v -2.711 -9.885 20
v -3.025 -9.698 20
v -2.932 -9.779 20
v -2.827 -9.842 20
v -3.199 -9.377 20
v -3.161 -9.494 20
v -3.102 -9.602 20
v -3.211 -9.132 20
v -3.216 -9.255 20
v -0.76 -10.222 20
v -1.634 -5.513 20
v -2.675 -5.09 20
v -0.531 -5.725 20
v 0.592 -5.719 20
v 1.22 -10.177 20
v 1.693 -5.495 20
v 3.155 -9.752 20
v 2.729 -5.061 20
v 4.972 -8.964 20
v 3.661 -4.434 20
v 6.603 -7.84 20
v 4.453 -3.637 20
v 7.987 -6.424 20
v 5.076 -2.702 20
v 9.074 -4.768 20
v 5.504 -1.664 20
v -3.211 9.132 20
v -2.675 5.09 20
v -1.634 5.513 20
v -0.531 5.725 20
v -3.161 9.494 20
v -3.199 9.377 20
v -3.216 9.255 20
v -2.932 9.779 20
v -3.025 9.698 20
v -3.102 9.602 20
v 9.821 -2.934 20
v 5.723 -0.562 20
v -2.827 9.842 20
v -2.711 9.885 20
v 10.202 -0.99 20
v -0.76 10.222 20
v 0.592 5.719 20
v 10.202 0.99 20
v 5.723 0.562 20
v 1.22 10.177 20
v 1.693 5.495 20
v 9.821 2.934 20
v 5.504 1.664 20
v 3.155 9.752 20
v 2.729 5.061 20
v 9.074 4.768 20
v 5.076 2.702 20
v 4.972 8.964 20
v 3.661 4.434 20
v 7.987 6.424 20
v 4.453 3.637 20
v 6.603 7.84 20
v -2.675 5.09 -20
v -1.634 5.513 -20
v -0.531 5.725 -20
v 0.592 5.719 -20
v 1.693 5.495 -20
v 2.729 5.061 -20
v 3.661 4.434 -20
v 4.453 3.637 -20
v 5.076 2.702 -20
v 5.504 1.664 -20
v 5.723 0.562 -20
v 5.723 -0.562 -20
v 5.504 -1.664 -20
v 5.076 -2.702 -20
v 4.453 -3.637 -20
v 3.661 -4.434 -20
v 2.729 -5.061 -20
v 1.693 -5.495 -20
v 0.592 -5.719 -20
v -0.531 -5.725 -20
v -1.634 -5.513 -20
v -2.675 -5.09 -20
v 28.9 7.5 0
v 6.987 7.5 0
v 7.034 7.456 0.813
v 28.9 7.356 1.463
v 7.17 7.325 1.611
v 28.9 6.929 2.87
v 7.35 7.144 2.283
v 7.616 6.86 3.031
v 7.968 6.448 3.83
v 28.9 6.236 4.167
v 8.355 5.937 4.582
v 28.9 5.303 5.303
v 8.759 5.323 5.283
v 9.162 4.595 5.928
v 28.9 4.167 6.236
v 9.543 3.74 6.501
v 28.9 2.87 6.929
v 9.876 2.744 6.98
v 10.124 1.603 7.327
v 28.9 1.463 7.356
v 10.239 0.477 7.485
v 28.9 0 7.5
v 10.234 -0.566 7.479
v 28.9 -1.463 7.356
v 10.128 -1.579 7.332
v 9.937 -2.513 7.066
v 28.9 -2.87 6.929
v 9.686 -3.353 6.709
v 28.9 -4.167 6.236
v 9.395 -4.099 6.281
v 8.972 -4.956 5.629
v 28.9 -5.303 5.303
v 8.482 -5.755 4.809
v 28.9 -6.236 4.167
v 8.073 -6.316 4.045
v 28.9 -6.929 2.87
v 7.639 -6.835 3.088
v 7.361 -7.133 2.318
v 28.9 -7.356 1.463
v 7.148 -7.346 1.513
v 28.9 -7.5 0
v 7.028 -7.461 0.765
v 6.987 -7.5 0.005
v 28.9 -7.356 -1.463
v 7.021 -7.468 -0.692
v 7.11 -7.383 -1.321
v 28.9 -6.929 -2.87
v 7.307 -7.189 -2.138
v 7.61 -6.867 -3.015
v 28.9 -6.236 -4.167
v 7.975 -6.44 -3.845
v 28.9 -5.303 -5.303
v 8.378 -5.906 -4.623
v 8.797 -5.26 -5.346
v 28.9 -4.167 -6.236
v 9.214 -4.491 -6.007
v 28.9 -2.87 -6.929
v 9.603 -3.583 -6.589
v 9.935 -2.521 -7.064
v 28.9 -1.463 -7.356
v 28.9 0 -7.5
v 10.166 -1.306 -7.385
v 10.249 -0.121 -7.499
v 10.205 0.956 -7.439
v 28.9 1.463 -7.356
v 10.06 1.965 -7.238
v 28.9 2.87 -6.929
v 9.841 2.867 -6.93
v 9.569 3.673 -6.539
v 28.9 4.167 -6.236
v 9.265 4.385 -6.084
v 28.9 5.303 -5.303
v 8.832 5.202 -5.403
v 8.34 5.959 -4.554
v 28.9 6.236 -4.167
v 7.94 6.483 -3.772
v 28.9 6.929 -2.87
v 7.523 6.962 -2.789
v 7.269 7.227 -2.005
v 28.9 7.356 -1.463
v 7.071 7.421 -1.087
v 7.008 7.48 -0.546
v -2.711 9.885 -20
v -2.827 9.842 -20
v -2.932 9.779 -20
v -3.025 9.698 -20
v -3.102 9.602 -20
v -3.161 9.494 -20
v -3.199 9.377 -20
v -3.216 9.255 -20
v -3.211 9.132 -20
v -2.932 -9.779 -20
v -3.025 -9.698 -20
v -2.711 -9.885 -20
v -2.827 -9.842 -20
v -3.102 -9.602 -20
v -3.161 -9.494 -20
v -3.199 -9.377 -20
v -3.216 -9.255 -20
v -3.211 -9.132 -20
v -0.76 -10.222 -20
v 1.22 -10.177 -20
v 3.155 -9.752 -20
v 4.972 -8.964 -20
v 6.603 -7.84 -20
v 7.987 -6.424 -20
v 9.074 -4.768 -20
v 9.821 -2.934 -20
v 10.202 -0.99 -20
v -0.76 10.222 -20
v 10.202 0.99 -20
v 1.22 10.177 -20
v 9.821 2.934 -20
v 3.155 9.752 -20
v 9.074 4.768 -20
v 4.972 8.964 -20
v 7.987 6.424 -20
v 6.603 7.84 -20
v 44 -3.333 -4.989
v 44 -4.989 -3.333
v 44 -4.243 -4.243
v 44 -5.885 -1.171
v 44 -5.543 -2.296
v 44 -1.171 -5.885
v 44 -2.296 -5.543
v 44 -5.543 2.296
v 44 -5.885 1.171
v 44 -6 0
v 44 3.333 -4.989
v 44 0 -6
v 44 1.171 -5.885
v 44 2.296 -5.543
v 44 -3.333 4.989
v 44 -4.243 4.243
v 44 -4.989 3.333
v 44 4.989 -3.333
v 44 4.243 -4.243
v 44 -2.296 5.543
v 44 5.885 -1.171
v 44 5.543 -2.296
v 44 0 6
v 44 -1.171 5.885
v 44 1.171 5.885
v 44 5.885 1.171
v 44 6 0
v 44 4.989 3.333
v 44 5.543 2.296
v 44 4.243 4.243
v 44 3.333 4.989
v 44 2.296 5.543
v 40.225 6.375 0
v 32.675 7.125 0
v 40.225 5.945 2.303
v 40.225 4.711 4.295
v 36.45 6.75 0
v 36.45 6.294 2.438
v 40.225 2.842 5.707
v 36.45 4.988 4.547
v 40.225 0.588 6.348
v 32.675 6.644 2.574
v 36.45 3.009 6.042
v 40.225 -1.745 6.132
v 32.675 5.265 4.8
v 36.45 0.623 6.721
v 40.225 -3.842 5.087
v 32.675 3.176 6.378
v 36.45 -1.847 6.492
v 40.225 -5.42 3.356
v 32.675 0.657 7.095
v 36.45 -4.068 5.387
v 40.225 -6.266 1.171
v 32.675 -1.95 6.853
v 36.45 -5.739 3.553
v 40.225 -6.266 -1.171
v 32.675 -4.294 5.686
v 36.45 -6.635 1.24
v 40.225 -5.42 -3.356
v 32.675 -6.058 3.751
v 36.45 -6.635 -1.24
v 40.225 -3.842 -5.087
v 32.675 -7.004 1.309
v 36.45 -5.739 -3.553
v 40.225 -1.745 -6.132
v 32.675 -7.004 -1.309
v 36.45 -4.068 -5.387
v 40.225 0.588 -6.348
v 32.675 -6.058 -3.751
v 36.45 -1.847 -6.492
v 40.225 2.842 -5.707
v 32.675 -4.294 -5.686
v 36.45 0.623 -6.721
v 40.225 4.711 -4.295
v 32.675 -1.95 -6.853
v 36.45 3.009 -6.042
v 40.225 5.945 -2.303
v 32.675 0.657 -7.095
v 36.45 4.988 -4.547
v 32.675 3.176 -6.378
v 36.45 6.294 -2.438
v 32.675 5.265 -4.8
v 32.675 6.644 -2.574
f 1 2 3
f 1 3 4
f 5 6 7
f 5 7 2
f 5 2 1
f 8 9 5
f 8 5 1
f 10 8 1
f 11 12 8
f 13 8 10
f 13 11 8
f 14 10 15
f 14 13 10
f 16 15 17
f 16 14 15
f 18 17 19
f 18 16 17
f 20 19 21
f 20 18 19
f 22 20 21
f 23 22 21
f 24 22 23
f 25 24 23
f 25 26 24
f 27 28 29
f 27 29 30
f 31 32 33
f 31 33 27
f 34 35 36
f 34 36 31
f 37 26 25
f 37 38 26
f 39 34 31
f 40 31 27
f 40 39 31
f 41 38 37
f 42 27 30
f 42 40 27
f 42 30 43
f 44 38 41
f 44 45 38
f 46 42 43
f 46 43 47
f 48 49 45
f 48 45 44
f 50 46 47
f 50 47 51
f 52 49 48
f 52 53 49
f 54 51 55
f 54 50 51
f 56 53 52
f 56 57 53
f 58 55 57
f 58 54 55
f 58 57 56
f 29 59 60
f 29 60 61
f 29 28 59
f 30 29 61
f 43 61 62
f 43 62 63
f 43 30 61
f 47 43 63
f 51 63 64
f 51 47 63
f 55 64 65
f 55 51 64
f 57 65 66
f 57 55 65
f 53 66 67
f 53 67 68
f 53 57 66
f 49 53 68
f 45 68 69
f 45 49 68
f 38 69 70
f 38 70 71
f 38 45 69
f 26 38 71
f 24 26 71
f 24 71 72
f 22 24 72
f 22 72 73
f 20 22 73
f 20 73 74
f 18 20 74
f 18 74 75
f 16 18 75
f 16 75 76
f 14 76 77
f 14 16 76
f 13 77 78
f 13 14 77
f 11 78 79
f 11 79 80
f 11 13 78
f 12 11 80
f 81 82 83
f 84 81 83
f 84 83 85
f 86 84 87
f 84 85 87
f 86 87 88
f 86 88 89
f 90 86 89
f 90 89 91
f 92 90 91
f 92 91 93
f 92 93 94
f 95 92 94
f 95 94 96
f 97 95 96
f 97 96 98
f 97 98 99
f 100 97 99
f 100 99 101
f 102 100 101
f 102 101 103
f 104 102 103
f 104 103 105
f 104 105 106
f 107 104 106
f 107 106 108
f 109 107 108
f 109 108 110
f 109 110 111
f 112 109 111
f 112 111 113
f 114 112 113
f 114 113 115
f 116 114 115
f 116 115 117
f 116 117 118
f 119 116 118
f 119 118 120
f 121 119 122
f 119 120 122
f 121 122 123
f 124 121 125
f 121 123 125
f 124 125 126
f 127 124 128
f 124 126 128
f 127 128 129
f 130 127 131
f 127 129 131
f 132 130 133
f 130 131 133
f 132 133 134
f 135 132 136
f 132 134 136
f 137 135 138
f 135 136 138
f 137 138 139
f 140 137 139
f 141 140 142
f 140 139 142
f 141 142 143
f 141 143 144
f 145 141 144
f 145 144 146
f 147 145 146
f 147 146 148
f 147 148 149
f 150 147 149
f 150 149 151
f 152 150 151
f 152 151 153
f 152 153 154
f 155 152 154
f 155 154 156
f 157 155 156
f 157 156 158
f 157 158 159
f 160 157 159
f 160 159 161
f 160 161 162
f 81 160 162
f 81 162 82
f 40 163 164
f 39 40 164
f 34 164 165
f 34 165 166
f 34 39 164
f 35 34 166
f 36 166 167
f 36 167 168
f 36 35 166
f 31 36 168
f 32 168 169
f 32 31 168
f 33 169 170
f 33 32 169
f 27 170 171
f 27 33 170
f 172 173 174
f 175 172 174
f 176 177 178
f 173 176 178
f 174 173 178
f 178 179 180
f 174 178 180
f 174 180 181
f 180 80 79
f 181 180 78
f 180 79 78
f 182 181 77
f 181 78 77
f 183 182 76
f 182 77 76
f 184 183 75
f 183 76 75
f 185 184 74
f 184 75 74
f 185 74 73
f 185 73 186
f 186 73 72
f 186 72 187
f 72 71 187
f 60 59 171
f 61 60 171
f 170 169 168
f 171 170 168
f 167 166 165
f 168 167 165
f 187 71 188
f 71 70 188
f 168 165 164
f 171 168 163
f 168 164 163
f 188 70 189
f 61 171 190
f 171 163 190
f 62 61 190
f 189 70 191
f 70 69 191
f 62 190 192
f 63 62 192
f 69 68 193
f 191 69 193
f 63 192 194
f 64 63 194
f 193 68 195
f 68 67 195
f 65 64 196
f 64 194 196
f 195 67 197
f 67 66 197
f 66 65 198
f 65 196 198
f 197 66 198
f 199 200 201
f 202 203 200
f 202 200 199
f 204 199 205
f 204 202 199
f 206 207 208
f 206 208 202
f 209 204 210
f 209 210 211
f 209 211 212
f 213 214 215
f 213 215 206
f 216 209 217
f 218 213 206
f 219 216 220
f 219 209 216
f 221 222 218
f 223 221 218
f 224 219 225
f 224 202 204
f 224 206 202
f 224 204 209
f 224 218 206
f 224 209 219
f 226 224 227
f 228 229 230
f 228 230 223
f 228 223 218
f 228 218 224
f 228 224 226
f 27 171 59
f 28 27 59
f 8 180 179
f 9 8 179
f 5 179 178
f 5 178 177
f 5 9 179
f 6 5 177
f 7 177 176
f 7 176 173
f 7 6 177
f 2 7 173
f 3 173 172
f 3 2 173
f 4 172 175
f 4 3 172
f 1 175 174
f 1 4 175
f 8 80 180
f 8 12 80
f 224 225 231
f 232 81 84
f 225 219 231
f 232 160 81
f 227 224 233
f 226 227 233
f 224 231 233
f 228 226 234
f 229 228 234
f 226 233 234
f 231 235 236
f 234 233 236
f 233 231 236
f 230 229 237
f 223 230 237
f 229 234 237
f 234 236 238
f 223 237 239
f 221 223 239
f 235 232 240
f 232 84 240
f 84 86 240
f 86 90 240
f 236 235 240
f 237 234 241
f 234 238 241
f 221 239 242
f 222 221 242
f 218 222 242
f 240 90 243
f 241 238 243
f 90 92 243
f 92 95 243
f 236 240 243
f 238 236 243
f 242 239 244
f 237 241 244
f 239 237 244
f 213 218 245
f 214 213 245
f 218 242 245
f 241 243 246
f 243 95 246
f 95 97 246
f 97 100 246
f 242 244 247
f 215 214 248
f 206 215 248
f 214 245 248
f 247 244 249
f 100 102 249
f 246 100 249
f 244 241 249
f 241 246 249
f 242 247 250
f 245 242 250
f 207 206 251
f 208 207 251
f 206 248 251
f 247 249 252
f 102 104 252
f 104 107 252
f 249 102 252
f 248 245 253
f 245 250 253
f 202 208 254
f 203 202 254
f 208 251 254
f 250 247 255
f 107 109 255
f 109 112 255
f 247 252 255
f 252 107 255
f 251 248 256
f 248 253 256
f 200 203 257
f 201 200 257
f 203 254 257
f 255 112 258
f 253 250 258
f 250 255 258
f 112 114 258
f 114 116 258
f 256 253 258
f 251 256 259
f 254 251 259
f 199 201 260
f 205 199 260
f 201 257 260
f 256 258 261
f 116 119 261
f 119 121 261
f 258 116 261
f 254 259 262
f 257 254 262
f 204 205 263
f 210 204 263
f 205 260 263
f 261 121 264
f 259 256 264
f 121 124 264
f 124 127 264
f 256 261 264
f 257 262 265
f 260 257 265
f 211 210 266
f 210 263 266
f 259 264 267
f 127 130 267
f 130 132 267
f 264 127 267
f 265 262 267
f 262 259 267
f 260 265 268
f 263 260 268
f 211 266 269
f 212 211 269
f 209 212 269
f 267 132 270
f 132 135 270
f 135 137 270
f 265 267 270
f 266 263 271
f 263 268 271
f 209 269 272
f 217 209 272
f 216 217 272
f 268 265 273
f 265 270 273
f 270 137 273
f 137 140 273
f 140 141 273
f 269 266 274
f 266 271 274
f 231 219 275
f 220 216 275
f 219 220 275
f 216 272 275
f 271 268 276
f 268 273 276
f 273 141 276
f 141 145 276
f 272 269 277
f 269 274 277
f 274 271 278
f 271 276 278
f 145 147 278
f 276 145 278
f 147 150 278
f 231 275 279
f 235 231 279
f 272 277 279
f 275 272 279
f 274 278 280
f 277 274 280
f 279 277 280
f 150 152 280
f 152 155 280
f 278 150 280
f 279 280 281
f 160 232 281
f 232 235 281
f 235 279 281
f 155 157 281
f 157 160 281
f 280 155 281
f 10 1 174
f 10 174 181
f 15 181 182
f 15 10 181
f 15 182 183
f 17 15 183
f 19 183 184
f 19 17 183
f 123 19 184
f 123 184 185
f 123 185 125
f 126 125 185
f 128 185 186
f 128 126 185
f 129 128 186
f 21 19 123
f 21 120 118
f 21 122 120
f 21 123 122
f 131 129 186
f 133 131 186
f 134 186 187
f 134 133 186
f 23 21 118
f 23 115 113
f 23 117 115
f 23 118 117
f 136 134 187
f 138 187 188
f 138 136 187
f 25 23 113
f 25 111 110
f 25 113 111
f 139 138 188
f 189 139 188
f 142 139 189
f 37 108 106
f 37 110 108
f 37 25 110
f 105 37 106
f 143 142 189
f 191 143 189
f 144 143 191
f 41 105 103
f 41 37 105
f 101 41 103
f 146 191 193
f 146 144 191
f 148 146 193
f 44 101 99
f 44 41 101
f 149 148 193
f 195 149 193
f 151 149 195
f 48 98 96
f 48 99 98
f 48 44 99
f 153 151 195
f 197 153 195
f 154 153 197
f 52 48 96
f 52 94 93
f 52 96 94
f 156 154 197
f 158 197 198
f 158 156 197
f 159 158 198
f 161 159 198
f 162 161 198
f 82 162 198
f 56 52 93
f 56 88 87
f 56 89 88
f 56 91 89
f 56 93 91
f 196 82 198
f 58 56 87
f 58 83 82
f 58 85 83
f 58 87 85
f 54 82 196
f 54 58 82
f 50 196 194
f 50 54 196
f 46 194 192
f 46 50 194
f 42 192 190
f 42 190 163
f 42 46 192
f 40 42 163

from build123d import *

# Parameters (mm, degrees)
F2_R     = 7.5
F3_DEPTH = 40
F4_SIZE2 = 15.1
F4_SIZE  = 1.5
F5_DEPTH = 2.5
F6_DEPTH = 20


with BuildPart() as f3:
    # F2 (on offset) → F3 (new body)
    with BuildSketch(Plane.YZ.offset(4)):
        Circle(F2_R)
    extrude(amount=F3_DEPTH)

    # F4
    f4_edges = [f3.edges().sort_by_distance(p)[0] for p in [
        (44, -7.5, 0),
    ]]
    f4_side = f3.faces().sort_by_distance((44, 0, 0))[0]
    chamfer(f4_edges, length=F4_SIZE, length2=F4_SIZE2, reference=f4_side)

    # F2 (on offset) → F5 (cut)
    with BuildSketch(Plane.YZ.offset(4)):
        Circle(F2_R)
    extrude(amount=F5_DEPTH, mode=Mode.SUBTRACT)

    # F0 (on Top) → F6 (join, symmetric)
    with BuildSketch(Plane.XY):
        with BuildLine():
            ThreePointArc((-3.2107160512, -9.1318440865), (-3.1021542498, -9.6020282515), (-2.711222774, -9.8849264575))
            ThreePointArc((-2.711222774, -9.8849264575), (10.25, 0), (-2.711222774, 9.8849264575))
            ThreePointArc((-2.711222774, 9.8849264575), (-3.1021542498, 9.6020282515), (-3.2107160512, 9.1318440865))
            Line((-3.2107160512, 9.1318440865), (-2.6748366384, 5.089965529))
            ThreePointArc((-2.6748366384, 5.089965529), (5.7500000112, 0), (-2.6748366384, -5.089965529))
            Line((-2.6748366384, -5.089965529), (-3.2107160512, -9.1318440865))
        make_face()
    extrude(amount=F6_DEPTH, both=True)


solid = f3.part
